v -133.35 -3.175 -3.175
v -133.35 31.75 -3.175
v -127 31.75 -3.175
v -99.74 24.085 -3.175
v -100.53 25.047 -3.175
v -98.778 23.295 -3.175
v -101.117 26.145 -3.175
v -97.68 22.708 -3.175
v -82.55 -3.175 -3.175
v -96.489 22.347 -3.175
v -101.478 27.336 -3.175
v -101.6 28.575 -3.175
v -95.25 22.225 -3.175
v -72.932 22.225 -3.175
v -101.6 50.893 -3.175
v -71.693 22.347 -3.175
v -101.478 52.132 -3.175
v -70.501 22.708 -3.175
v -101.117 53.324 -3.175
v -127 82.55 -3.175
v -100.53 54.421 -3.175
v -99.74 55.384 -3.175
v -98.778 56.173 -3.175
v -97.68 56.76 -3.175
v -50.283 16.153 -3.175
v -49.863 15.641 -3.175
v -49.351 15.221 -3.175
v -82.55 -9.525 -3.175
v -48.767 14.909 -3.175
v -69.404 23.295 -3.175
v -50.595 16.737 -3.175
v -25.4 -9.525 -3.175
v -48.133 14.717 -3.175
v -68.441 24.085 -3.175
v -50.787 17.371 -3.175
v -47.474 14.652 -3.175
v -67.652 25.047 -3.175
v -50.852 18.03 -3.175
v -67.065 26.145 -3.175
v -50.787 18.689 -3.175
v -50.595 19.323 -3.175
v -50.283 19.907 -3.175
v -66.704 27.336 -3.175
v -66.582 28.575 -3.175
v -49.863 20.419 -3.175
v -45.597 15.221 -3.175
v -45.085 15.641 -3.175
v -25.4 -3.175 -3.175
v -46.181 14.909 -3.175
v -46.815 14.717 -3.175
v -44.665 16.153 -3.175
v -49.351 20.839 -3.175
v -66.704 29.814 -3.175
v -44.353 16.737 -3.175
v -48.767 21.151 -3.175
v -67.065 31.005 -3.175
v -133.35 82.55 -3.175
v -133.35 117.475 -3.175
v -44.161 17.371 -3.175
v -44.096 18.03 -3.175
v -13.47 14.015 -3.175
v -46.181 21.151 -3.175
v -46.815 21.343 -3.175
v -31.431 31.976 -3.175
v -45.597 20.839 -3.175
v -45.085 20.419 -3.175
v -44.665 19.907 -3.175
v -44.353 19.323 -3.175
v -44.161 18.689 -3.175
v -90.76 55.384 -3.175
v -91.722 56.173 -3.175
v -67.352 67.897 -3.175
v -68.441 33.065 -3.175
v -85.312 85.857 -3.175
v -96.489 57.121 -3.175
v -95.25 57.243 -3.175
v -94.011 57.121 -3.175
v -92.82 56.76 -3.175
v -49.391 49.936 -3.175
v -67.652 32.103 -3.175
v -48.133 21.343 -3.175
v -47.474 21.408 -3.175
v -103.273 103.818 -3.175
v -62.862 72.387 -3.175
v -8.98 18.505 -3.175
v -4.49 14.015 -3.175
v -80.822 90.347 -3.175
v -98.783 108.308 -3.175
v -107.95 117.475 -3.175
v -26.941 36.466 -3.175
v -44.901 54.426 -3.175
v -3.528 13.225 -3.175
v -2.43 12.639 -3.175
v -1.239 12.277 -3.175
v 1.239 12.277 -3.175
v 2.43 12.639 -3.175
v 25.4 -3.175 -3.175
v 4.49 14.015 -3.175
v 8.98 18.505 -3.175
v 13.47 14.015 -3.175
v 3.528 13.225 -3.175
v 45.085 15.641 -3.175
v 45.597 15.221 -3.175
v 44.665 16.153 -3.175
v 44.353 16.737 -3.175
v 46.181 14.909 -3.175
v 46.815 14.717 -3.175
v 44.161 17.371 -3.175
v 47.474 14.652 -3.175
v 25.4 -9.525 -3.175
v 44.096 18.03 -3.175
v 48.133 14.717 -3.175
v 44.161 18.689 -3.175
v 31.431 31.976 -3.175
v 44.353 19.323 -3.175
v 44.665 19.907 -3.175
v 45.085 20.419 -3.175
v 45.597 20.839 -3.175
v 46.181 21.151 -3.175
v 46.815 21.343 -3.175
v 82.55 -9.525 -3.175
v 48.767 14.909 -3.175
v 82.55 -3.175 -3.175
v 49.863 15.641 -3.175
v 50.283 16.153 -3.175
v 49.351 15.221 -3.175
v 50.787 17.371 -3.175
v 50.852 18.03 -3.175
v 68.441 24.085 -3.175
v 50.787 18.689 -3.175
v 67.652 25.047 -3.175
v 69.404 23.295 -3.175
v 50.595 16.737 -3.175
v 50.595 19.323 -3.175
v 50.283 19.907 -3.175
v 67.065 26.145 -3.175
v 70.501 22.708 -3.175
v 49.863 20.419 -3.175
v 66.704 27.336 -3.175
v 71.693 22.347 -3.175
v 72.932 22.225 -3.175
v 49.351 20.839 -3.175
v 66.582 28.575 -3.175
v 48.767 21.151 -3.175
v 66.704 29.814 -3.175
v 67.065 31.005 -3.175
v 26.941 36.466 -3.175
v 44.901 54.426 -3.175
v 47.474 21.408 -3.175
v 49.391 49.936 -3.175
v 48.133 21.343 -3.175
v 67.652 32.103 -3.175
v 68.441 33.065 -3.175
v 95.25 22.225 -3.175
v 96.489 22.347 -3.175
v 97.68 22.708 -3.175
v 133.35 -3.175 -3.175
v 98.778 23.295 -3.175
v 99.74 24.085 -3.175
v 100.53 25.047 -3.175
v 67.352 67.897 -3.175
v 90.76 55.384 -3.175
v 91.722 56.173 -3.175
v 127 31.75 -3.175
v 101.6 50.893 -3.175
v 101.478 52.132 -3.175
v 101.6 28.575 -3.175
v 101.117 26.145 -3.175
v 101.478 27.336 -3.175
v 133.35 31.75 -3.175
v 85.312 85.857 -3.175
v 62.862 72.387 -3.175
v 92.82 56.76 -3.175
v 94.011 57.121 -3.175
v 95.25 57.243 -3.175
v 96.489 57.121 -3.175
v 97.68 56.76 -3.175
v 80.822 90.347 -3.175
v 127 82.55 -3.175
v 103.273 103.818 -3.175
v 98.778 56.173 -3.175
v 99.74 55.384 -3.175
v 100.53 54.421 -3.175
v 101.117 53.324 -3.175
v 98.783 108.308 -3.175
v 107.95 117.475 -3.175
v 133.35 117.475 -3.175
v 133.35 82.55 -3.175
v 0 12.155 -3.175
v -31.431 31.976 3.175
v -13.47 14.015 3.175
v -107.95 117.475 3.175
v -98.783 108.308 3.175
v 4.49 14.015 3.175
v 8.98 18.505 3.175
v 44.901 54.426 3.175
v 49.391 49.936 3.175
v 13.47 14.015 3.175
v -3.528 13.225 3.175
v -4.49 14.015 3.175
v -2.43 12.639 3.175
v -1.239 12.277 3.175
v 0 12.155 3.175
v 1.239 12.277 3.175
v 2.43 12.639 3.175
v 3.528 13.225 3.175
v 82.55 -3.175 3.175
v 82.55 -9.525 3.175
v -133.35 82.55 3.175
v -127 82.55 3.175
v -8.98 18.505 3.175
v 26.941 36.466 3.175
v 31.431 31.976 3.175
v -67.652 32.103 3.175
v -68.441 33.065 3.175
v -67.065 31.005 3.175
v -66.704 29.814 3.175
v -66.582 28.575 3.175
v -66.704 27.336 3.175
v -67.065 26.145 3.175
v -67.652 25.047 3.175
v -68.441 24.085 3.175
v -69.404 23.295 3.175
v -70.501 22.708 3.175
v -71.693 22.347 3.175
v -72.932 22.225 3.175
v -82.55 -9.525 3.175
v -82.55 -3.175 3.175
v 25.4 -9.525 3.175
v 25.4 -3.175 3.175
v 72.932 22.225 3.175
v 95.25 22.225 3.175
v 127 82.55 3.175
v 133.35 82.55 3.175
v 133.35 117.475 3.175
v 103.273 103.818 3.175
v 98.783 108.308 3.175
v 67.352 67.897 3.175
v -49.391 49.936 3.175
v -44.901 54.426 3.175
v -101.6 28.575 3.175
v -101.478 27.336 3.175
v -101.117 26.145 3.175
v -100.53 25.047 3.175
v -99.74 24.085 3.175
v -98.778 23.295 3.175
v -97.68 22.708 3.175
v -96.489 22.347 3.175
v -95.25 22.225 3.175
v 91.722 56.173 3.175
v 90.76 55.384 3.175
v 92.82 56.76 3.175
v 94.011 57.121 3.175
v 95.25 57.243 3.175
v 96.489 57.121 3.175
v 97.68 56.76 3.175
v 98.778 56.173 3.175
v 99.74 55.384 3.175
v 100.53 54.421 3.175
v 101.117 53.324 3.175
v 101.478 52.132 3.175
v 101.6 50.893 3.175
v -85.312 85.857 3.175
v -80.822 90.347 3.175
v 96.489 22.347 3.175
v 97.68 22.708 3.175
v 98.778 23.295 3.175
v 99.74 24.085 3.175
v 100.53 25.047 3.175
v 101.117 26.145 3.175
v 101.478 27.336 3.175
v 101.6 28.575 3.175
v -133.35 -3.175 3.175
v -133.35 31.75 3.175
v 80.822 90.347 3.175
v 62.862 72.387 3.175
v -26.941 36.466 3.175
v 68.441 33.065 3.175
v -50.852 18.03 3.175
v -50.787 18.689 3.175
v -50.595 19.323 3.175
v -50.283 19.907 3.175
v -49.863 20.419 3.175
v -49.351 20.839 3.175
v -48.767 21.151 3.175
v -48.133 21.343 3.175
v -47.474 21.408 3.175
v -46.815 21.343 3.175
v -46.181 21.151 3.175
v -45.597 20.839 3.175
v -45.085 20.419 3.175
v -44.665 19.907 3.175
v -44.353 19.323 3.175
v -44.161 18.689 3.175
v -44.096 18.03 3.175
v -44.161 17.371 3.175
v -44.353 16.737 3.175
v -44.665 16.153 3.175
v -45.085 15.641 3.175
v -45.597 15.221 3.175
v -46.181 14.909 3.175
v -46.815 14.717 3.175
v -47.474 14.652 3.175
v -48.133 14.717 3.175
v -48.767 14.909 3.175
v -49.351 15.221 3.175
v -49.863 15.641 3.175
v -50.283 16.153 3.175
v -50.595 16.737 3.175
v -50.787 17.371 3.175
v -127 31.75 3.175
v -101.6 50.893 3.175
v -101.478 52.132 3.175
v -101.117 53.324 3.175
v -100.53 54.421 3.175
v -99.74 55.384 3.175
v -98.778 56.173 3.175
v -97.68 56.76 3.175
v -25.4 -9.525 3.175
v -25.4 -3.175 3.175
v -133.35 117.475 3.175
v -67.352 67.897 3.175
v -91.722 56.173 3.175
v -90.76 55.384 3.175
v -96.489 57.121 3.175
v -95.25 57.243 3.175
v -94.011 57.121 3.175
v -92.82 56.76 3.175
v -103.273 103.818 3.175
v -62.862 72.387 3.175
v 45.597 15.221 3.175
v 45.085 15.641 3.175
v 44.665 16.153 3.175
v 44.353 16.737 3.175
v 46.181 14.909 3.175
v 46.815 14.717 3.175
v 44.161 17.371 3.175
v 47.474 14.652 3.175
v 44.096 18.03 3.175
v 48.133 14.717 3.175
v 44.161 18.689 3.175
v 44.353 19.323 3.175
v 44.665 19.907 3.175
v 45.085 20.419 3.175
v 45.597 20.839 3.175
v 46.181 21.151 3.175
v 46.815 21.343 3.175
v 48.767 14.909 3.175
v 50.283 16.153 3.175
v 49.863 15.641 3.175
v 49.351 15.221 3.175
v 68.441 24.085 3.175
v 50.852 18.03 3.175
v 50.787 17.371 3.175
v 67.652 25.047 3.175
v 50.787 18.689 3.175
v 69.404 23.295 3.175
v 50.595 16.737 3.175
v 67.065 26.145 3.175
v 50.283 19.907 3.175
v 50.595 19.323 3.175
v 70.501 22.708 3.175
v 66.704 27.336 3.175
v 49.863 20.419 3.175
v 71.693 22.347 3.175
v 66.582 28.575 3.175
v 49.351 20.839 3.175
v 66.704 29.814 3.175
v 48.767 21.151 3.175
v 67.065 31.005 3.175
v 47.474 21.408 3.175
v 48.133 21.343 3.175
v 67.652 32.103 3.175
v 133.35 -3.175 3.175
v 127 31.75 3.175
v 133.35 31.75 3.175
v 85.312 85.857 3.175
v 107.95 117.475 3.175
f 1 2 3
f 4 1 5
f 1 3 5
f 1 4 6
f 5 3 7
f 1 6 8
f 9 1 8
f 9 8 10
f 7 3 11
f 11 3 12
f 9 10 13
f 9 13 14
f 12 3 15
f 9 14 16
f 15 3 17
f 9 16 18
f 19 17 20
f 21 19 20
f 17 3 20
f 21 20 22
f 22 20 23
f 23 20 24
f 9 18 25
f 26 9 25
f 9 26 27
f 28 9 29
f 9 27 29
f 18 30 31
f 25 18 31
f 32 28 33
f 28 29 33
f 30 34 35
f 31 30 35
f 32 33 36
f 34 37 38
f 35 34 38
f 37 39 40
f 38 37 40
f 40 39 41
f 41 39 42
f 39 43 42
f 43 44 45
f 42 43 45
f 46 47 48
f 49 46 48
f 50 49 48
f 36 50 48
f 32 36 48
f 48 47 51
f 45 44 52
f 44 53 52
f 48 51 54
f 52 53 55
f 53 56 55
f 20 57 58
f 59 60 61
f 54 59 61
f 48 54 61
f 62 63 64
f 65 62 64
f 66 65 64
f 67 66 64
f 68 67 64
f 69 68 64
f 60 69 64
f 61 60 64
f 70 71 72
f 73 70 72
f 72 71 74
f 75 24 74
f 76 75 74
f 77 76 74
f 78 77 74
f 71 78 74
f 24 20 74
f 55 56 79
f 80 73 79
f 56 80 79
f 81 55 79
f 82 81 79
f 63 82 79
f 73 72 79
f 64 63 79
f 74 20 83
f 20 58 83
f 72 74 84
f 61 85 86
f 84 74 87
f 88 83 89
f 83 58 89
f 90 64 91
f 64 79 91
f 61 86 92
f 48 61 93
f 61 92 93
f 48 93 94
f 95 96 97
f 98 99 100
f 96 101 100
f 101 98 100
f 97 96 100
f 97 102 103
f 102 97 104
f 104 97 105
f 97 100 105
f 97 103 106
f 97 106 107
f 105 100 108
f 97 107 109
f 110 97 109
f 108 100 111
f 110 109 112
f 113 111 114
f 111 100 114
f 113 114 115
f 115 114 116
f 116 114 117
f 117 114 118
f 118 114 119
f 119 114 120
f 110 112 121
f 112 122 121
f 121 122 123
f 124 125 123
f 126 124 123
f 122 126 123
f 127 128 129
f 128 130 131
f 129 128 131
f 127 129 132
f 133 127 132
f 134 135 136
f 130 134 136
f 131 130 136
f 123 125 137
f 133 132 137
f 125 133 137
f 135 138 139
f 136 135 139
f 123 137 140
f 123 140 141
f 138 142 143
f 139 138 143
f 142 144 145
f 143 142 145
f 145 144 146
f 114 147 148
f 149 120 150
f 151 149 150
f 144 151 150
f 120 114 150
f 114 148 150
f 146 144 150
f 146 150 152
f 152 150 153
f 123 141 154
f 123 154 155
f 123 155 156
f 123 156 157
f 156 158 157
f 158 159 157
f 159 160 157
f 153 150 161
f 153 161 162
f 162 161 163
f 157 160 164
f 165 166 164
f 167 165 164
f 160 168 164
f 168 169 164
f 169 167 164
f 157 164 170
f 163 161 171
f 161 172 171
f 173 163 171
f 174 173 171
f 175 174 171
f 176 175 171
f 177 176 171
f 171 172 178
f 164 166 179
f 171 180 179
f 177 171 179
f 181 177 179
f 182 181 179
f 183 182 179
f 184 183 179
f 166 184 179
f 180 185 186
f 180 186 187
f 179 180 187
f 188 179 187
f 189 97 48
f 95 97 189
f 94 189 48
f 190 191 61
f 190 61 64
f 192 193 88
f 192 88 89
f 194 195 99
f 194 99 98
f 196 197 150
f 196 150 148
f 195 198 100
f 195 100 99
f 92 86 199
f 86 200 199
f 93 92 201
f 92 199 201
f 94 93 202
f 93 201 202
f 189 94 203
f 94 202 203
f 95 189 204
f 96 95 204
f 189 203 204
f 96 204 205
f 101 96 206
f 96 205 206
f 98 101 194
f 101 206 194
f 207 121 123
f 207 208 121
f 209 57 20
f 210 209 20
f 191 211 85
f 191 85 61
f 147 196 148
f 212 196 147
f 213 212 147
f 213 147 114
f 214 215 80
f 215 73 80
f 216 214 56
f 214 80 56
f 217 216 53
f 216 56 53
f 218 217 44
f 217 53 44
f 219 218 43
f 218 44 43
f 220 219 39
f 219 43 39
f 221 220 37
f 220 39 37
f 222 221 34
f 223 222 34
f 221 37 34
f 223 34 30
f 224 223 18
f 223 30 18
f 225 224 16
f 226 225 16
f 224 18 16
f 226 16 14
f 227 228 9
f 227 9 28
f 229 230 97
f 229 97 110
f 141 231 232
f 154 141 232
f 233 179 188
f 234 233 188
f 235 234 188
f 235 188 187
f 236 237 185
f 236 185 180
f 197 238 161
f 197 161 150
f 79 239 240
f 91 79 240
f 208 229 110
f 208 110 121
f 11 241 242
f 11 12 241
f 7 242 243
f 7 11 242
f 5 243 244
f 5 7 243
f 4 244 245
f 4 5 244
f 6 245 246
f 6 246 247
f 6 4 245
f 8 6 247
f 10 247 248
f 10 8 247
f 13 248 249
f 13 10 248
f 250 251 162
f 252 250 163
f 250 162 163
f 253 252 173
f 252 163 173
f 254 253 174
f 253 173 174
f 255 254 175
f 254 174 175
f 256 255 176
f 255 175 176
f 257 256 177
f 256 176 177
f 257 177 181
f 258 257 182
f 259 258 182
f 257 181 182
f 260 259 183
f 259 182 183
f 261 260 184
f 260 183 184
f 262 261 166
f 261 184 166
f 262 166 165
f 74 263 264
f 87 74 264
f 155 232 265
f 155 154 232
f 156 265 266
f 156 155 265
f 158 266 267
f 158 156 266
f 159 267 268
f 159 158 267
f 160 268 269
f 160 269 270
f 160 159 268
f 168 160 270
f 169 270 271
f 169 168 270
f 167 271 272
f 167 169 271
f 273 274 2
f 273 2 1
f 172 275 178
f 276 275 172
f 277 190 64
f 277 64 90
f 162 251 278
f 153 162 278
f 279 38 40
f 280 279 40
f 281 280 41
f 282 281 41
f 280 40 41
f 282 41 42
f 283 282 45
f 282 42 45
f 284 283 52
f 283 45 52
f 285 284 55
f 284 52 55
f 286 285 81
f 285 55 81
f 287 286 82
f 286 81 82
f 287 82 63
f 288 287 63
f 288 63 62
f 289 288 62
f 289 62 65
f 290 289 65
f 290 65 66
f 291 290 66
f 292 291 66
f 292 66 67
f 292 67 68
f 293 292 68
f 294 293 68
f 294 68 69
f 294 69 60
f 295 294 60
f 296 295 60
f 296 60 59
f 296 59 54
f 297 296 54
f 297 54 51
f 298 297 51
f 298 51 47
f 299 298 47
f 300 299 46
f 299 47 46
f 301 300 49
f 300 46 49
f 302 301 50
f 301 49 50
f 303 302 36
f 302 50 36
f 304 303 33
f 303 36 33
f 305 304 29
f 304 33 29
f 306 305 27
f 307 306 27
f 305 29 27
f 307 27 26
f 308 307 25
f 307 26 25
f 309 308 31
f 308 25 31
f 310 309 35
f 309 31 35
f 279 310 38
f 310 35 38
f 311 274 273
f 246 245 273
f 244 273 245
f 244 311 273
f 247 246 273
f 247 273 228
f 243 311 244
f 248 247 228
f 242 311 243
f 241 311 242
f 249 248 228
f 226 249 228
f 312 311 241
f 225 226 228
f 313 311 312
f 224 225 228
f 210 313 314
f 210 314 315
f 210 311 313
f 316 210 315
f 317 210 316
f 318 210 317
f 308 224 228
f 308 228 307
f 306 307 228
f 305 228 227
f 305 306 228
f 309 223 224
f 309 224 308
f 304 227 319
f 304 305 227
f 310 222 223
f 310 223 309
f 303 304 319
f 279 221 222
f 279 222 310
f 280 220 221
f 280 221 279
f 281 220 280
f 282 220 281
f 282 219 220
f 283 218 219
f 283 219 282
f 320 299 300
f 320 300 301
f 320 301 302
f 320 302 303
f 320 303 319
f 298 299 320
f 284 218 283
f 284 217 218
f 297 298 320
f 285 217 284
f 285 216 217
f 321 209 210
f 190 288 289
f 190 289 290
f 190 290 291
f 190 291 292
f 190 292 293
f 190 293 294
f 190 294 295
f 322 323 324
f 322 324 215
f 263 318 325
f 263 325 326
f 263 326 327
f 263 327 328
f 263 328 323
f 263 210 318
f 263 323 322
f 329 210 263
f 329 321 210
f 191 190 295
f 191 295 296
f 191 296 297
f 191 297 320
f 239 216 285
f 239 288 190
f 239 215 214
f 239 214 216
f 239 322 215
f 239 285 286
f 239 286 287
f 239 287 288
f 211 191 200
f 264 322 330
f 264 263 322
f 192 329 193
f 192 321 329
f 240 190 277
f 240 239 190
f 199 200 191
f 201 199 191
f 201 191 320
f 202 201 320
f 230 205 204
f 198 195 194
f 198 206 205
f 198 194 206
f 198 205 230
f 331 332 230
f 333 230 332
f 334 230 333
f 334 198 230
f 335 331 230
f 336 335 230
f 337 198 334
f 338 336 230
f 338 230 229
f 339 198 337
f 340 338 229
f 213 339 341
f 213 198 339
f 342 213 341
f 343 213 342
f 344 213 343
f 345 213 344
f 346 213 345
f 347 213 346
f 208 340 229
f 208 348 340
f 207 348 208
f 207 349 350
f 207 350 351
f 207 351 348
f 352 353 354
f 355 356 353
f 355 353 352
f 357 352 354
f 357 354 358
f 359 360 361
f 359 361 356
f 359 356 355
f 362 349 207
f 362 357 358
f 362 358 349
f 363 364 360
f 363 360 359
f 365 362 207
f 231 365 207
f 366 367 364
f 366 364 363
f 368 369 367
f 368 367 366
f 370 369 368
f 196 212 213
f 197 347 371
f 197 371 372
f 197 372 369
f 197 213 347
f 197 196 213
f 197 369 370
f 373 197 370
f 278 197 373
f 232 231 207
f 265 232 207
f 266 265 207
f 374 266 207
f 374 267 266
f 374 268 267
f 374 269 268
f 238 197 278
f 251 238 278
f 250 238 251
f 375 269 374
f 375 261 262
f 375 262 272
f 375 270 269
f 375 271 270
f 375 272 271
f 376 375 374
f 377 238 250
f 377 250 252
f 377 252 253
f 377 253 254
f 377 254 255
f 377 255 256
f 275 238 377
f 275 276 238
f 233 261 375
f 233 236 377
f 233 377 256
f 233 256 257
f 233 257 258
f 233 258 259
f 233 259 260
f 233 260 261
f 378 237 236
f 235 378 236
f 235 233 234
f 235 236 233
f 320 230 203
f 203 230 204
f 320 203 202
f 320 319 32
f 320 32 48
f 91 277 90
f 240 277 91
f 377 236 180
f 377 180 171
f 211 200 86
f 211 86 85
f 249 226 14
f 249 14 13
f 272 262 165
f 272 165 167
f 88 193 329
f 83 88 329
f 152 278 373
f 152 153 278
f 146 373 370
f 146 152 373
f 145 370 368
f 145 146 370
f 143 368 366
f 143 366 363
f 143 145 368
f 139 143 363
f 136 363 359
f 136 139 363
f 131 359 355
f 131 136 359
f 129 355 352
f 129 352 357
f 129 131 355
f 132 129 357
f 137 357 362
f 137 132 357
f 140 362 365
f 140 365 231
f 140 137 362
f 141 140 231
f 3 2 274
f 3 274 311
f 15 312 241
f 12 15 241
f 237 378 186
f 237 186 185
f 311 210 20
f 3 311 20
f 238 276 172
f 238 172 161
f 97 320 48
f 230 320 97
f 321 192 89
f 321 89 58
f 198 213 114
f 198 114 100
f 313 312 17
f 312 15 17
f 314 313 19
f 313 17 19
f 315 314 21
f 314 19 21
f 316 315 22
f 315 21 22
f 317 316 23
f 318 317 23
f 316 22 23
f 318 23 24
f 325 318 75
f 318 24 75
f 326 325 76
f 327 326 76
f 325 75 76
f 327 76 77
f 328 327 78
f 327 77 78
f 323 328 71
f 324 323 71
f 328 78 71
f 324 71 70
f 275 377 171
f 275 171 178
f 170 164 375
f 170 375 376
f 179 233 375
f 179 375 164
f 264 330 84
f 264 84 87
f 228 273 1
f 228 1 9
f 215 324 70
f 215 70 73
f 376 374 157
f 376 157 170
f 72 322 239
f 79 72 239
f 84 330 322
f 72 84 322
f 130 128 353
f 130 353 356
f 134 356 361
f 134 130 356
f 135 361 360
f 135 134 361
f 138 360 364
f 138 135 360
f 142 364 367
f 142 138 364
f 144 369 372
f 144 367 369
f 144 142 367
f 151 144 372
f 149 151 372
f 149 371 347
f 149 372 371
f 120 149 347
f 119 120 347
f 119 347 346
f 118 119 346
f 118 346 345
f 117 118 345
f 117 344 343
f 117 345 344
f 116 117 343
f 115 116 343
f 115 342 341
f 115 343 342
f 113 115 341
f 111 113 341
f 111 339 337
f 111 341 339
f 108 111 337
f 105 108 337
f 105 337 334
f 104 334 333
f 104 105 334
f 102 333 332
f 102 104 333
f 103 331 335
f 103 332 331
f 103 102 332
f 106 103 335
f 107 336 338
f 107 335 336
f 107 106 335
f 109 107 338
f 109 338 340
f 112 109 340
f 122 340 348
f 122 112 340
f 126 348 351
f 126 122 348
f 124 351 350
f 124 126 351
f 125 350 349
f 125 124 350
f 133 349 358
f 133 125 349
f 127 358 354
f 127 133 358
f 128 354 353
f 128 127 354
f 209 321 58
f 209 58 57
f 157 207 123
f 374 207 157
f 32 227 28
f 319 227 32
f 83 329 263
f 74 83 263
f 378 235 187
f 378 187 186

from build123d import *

# Parameters (mm, degrees)
BOSS_EXTRUDE1_DEPTH     = 3.175
CUT_EXTRUDE1_DEPTH      = 178.828345955
CAVITY1_START           = 31.75
CAVITY1_OUTLINE_W       = 6.35
CAVITY1_OUTLINE_H       = 6.35
CAVITY1_DEPTH           = 50.8
FILLET1_R               = 6.35
CUT_EXTRUDE2_DEPTH      = 178.828345955
FILLET2_R               = 6.35
F_1_4_CLEARANCE_HOLE1_D = 6.7564


# Read off the part's stored shape, not the designer's step: Cavity1
with BuildPart() as part:
    # Sketch1 → Boss-Extrude1 (new, symmetric)
    with BuildSketch(Plane.XY):
        Polygon((133.35, -3.175), (133.35, 117.475), (107.95, 117.475), (0, 9.525), (-107.95, 117.475), (-133.35, 117.475), (-133.35, -3.175), (-82.55, -3.175), (-82.55, -9.525), (-25.4, -9.525), (-25.4, -3.175), (25.4, -3.175), (25.4, -9.525), (82.55, -9.525), (82.55, -3.175), align=None)
    extrude(amount=BOSS_EXTRUDE1_DEPTH, both=True)

    # Sketch2 → Cut-Extrude1 (cut, through all)
    with BuildSketch(Plane.XY.offset(3.175)):
        Polygon((-8.980256121, 18.505256121), (-13.470384182, 14.015128061), (-31.430896424, 31.975640303), (-26.940768363, 36.465768363), align=None)
        Polygon((-62.861792847, 72.386792847), (-67.351920908, 67.896664787), (-49.391408666, 49.936152545), (-44.901280605, 54.426280605), align=None)
        Polygon((-98.782817332, 108.307817332), (-103.272945392, 103.817689271), (-85.31243315, 85.857177029), (-80.82230509, 90.34730509), align=None)
        Polygon((80.82230509, 90.34730509), (98.782817332, 108.307817332), (103.272945392, 103.817689271), (85.31243315, 85.857177029), align=None)
        Polygon((44.901280605, 54.426280605), (62.861792847, 72.386792847), (67.351920908, 67.896664787), (49.391408666, 49.936152545), align=None)
        Polygon((26.940768363, 36.465768363), (31.430896424, 31.975640303), (13.470384182, 14.015128061), (8.980256121, 18.505256121), align=None)
    extrude(amount=-CUT_EXTRUDE1_DEPTH, mode=Mode.SUBTRACT)

    # Cavity1 outline → Cavity1 (cut)
    with BuildSketch(Plane(origin=(0, 0, 0), x_dir=(1, 0, 0), z_dir=(0, 1, 0)).offset(CAVITY1_START)):
        with Locations((130.175, 0)):
            Rectangle(CAVITY1_OUTLINE_W, CAVITY1_OUTLINE_H)
        with Locations((-130.175, 0)):
            Rectangle(CAVITY1_OUTLINE_W, CAVITY1_OUTLINE_H)
    extrude(amount=CAVITY1_DEPTH, mode=Mode.SUBTRACT)

    # Fillet1
    fillet1_edges = [part.edges().sort_by_distance(p)[0] for p in [
        (0, 9.525, 0),
    ]]
    fillet(fillet1_edges, radius=FILLET1_R)

    # Sketch3 → Cut-Extrude2 (cut, through all)
    with BuildSketch(Plane.XY.offset(3.175)):
        Polygon((-101.6, 66.223719395), (-57.601280605, 22.225), (-101.6, 22.225), (-101.6, 31.75), align=None)
    cut_extrude2 = extrude(amount=-CUT_EXTRUDE2_DEPTH, mode=Mode.SUBTRACT)

    # Mirror1: Cut-Extrude2 across plane
    add(cut_extrude2.mirror(Plane(origin=(0, 0, 0), x_dir=(0, 0, 1), z_dir=(1, 0, 0))), mode=Mode.SUBTRACT)

    # Fillet2
    fillet2_edges = [part.edges().sort_by_distance(p)[0] for p in [
        (-57.601280605, 22.225, 0),
        (-101.6, 22.225, 0),
        (-101.6, 66.223719395, 0),
        (101.6, 22.225, 0),
        (57.601280605, 22.225, 0),
        (101.6, 66.223719395, 0),
    ]]
    fillet(fillet2_edges, radius=FILLET2_R)

    # 1/4 Clearance Hole1 (through all)
    with Locations(Plane.XY.offset(3.175)):
        with Locations((-47.473930622, 18.030114286)):
            f_1_4_clearance_hole1 = Hole(F_1_4_CLEARANCE_HOLE1_D / 2)

    # Mirror2: 1/4 Clearance Hole1 across plane
    add(f_1_4_clearance_hole1.mirror(Plane(origin=(0, 0, 0), x_dir=(0, 0, 1), z_dir=(1, 0, 0))), mode=Mode.SUBTRACT)


solid = part.part
